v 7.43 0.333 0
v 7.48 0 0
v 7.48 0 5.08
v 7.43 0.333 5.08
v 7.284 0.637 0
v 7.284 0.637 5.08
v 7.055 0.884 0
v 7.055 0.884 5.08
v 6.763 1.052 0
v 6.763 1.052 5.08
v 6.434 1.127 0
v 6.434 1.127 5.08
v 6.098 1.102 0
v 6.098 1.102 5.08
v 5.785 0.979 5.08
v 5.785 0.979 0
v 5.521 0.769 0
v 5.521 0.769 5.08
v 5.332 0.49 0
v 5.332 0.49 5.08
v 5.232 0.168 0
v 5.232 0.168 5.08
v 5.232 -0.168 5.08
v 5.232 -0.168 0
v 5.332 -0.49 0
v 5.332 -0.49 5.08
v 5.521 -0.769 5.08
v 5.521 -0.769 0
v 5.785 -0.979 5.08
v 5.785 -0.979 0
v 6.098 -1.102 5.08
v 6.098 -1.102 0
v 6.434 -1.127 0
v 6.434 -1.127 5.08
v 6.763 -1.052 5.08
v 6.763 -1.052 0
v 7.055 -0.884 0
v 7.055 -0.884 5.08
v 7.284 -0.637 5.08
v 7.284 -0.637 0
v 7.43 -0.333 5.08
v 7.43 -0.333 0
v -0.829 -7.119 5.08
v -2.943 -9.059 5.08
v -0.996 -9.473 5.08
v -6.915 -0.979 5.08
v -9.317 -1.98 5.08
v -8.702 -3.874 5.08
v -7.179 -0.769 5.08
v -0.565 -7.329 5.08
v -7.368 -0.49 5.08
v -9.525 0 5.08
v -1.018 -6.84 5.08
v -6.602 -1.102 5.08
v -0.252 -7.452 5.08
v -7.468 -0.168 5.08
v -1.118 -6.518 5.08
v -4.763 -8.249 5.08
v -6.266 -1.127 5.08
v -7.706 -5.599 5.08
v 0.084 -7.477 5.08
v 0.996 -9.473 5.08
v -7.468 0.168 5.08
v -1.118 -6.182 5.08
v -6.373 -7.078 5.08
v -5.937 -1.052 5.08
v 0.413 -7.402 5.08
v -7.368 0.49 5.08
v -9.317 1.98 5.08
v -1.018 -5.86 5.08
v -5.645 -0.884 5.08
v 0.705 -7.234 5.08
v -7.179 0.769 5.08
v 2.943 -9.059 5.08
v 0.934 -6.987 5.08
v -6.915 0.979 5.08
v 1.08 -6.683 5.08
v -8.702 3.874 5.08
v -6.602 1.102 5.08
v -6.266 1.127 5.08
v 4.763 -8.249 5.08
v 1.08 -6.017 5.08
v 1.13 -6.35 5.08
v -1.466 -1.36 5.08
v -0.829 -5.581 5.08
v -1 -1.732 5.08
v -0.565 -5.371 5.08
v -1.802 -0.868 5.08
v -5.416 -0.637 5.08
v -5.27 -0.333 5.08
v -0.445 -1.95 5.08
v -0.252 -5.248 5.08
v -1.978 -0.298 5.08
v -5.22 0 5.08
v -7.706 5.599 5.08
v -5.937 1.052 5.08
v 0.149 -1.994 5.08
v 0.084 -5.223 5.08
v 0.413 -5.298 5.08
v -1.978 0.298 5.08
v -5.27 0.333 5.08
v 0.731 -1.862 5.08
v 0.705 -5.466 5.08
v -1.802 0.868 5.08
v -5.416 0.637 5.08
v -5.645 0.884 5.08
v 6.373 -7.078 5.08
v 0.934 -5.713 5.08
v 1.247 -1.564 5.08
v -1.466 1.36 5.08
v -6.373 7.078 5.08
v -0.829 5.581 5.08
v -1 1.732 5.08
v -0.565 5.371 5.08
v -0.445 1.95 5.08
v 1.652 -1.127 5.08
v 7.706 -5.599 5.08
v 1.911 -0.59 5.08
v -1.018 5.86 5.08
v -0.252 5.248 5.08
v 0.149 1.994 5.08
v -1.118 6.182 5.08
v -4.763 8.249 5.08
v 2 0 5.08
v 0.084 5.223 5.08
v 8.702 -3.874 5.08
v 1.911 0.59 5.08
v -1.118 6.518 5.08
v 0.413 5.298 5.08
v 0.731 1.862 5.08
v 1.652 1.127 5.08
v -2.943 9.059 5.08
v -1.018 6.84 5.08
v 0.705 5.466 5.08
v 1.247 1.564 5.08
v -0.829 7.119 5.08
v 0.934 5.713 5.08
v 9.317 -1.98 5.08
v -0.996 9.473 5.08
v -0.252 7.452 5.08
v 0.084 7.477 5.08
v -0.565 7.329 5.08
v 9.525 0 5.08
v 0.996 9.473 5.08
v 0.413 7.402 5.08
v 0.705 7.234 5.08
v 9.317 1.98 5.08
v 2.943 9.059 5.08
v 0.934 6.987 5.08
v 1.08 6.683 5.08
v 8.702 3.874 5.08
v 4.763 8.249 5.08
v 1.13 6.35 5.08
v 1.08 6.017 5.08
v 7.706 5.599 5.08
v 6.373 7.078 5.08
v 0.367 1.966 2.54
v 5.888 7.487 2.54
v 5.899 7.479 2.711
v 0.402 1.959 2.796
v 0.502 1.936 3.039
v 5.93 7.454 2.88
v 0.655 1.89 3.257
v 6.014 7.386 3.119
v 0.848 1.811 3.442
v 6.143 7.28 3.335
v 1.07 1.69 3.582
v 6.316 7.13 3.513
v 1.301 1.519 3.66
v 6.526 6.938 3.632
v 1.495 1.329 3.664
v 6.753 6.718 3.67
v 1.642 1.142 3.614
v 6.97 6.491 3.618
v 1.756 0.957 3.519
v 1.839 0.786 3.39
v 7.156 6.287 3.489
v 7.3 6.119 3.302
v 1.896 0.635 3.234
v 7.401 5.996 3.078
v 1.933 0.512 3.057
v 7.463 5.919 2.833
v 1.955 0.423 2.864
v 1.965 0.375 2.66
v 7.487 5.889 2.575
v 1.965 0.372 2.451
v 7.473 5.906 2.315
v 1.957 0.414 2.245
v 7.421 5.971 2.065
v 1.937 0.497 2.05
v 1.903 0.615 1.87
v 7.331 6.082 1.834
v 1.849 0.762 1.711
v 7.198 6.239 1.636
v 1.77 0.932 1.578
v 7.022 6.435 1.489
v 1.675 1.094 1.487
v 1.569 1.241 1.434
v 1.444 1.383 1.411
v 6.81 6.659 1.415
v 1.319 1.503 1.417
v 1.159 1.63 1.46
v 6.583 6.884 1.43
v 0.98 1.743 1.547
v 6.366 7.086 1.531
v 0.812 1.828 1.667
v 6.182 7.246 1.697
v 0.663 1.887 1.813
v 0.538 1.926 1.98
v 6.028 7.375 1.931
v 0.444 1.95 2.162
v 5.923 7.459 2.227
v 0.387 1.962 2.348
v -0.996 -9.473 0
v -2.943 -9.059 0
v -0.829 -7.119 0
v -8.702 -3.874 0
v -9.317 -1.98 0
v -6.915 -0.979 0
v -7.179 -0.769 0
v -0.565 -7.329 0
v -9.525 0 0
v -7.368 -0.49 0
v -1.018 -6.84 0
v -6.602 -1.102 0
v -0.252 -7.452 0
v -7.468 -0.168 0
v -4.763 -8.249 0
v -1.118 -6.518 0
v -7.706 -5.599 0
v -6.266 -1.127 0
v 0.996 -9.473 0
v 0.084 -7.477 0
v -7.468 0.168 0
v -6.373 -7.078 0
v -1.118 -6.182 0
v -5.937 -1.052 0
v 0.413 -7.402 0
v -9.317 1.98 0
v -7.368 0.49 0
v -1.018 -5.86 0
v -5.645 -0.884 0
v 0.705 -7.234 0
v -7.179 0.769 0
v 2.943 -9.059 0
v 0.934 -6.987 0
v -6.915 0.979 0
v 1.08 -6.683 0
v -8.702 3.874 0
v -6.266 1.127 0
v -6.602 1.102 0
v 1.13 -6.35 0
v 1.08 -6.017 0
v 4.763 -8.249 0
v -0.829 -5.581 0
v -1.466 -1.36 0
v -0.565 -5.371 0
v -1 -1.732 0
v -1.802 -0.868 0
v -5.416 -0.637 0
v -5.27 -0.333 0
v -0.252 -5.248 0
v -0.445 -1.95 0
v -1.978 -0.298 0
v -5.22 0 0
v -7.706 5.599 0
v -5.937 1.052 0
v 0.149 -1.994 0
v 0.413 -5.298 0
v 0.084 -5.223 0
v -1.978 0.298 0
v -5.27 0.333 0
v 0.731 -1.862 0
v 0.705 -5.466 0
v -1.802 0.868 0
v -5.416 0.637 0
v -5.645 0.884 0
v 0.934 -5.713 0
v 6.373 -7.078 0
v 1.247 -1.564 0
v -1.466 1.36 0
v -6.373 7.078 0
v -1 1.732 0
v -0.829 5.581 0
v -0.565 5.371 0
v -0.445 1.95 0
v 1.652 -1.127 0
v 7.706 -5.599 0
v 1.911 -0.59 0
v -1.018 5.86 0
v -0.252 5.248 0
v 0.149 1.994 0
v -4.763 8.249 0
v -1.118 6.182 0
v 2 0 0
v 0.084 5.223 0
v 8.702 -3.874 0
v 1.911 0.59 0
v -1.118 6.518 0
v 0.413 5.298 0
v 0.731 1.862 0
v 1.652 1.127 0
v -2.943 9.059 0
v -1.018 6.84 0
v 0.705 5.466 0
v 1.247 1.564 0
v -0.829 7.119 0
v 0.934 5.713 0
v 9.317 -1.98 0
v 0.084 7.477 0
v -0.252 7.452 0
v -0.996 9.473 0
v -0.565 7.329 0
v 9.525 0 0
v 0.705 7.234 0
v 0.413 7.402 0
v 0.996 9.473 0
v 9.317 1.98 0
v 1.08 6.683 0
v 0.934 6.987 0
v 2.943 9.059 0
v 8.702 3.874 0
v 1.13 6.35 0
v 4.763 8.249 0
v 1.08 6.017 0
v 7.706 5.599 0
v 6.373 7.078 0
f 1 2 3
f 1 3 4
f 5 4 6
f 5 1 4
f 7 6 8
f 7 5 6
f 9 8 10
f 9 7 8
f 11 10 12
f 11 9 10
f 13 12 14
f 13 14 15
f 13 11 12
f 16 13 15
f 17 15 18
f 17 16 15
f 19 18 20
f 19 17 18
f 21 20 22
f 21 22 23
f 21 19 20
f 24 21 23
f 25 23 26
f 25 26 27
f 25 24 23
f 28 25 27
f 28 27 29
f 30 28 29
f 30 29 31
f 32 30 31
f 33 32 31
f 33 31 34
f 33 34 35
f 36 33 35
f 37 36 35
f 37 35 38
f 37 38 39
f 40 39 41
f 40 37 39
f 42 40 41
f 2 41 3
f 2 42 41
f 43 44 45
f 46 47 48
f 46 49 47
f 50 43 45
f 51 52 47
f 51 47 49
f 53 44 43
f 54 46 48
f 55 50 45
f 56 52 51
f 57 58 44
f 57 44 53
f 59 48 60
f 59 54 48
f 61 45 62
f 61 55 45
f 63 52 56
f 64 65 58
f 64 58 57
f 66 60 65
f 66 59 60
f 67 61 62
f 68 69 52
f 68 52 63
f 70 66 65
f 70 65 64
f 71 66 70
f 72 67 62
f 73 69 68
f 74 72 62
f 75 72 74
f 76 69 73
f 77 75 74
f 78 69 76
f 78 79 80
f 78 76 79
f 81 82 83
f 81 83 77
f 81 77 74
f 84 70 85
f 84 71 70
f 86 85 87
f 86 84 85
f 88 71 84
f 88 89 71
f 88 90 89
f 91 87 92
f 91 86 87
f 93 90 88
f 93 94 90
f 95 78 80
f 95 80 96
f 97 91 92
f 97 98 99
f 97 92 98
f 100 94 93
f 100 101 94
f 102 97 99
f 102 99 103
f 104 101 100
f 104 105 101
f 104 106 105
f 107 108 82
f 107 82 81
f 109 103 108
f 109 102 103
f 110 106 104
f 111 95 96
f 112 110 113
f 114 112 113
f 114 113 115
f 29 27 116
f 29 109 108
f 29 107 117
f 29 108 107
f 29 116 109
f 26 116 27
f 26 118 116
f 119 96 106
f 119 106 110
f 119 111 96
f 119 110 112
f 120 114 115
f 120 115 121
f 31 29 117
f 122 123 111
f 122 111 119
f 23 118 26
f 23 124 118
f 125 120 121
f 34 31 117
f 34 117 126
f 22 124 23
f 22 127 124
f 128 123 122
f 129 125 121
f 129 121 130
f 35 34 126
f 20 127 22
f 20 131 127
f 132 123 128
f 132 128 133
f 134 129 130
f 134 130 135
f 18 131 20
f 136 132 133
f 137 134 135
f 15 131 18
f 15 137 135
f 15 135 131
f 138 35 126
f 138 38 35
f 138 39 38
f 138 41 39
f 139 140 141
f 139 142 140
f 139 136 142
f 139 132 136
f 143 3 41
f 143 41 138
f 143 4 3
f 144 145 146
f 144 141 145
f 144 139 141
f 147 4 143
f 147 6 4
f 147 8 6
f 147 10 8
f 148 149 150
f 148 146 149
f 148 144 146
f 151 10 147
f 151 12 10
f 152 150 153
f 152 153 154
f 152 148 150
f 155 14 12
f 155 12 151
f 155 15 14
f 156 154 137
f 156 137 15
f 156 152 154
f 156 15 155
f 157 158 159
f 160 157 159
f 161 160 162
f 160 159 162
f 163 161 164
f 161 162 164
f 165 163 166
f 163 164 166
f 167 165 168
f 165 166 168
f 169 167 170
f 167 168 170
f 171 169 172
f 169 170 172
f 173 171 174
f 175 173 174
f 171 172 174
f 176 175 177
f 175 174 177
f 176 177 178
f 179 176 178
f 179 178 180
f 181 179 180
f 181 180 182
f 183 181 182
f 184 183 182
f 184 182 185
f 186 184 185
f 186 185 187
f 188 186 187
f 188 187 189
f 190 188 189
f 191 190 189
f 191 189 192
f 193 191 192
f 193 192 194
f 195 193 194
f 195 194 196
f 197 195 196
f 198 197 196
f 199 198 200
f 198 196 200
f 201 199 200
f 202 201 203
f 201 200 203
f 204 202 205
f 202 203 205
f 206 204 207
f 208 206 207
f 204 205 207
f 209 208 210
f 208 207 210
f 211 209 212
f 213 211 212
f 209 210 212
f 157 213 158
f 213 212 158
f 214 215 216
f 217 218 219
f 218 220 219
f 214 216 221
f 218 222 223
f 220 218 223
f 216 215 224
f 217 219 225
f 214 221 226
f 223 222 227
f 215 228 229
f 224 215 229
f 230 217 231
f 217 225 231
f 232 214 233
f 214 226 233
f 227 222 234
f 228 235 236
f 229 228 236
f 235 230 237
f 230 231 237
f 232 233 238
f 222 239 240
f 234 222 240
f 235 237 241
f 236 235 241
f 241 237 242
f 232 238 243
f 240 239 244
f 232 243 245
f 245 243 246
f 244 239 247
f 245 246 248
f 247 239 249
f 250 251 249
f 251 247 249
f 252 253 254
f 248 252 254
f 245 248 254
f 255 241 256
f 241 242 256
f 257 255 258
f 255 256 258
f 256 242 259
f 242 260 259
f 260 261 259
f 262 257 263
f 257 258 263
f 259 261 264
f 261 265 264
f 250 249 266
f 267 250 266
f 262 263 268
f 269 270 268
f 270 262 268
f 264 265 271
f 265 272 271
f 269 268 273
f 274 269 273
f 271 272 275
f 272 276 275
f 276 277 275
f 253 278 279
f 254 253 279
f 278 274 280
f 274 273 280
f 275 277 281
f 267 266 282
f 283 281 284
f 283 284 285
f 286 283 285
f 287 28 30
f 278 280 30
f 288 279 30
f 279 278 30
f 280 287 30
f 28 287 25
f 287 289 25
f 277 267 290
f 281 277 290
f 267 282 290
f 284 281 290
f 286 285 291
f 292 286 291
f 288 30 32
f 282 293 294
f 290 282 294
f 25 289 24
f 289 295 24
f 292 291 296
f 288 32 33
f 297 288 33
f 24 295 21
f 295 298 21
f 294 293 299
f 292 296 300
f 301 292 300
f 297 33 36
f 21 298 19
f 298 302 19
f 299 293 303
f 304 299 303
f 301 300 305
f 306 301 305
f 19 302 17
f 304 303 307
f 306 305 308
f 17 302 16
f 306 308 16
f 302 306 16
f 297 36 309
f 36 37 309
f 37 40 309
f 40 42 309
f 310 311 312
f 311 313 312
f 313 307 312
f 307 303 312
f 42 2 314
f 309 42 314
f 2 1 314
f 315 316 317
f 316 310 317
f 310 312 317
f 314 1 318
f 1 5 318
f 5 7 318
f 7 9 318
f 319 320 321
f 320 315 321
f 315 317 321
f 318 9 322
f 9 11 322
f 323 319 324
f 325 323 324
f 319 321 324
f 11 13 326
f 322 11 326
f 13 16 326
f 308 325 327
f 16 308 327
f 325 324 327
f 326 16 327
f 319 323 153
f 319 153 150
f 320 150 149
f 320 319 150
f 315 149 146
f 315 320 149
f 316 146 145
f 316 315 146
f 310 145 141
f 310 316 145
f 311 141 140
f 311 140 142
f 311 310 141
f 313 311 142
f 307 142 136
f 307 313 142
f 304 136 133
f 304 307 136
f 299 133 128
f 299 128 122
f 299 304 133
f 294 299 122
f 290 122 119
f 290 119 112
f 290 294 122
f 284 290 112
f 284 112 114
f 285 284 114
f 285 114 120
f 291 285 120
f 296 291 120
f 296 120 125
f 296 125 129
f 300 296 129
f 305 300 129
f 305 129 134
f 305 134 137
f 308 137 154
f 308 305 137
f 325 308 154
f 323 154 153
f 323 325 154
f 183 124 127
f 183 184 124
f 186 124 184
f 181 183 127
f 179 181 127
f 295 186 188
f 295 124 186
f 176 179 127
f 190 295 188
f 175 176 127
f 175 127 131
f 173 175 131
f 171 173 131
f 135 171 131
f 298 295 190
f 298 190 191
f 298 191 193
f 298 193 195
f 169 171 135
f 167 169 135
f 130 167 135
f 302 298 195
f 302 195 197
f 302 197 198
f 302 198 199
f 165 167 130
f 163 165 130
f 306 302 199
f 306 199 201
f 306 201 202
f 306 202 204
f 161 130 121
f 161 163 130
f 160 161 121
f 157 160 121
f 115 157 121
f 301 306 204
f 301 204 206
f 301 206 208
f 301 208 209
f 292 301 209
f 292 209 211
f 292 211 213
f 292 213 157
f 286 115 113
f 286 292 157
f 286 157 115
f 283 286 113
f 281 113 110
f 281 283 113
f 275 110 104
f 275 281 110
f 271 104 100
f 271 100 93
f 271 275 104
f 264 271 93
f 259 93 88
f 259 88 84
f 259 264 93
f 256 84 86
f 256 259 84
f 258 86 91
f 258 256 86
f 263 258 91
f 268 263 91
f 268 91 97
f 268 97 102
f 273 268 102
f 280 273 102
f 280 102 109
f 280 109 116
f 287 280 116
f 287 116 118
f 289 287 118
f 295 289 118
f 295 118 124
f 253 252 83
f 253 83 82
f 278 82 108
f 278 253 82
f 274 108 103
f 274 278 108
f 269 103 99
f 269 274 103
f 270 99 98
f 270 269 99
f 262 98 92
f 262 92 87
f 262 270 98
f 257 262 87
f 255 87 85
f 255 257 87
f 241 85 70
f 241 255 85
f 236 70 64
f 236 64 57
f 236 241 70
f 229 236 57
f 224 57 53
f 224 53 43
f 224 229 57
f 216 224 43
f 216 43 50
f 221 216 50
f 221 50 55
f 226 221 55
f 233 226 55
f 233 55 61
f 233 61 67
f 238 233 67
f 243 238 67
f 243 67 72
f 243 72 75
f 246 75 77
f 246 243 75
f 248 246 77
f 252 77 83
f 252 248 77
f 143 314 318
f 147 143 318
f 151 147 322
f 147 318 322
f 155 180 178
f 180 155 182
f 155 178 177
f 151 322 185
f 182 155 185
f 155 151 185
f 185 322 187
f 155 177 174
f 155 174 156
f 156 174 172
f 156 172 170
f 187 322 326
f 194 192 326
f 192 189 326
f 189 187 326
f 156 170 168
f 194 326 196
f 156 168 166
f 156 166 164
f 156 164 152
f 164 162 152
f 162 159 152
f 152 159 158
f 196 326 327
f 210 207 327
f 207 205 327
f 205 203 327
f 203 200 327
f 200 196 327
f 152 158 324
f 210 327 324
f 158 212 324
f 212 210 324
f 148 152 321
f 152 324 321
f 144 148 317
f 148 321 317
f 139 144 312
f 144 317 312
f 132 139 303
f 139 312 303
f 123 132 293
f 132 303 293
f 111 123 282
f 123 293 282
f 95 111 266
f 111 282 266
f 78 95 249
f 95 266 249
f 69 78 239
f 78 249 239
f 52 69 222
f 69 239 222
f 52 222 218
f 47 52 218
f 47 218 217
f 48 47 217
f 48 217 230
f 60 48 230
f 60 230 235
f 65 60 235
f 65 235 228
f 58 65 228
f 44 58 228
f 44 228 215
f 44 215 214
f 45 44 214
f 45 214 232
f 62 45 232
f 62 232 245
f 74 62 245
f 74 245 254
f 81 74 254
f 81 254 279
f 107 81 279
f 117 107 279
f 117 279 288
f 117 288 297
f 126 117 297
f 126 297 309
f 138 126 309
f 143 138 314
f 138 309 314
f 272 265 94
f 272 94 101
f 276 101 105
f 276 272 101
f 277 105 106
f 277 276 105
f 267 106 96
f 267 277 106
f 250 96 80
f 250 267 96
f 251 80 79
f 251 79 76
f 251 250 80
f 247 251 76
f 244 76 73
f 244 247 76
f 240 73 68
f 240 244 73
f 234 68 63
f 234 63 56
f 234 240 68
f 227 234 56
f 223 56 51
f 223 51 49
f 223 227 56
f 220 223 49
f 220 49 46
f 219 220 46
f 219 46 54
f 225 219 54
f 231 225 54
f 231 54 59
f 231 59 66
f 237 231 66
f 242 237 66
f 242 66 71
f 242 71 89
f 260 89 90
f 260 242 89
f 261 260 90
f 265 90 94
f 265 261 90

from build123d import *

# Parameters (mm, degrees)
SKETCH1_R           = 9.525
SKETCH1_R_2         = 2
SKETCH1_R_3         = 1.1303
BOSS_EXTRUDE1_DEPTH = 5.08
SKETCH2_R           = 1.1303
CUT_EXTRUDE1_DEPTH  = 10.16


with BuildPart() as part:
    # Sketch1 → Boss-Extrude1 (new body)
    with BuildSketch(Plane.XY):
        Circle(SKETCH1_R)
        Circle(SKETCH1_R_2, mode=Mode.SUBTRACT)
        with Locations((-6.35, 0)):
            Circle(SKETCH1_R_3, mode=Mode.SUBTRACT)
        with Locations((0, 6.35)):
            Circle(SKETCH1_R_3, mode=Mode.SUBTRACT)
        with Locations((6.35, 0)):
            Circle(SKETCH1_R_3, mode=Mode.SUBTRACT)
        with Locations((0, -6.35)):
            Circle(SKETCH1_R_3, mode=Mode.SUBTRACT)
    extrude(amount=BOSS_EXTRUDE1_DEPTH)

    # Sketch2 → Cut-Extrude1 (cut)
    with BuildSketch(Plane(origin=(6.735192091, 6.735192091, 0), x_dir=(-0.707106781, 0.707106781, 0), z_dir=(0.707106781, 0.707106781, 0))):
        with Locations((0, 2.54)):
            Circle(SKETCH2_R)
    extrude(amount=-CUT_EXTRUDE1_DEPTH, mode=Mode.SUBTRACT)


solid = part.part
